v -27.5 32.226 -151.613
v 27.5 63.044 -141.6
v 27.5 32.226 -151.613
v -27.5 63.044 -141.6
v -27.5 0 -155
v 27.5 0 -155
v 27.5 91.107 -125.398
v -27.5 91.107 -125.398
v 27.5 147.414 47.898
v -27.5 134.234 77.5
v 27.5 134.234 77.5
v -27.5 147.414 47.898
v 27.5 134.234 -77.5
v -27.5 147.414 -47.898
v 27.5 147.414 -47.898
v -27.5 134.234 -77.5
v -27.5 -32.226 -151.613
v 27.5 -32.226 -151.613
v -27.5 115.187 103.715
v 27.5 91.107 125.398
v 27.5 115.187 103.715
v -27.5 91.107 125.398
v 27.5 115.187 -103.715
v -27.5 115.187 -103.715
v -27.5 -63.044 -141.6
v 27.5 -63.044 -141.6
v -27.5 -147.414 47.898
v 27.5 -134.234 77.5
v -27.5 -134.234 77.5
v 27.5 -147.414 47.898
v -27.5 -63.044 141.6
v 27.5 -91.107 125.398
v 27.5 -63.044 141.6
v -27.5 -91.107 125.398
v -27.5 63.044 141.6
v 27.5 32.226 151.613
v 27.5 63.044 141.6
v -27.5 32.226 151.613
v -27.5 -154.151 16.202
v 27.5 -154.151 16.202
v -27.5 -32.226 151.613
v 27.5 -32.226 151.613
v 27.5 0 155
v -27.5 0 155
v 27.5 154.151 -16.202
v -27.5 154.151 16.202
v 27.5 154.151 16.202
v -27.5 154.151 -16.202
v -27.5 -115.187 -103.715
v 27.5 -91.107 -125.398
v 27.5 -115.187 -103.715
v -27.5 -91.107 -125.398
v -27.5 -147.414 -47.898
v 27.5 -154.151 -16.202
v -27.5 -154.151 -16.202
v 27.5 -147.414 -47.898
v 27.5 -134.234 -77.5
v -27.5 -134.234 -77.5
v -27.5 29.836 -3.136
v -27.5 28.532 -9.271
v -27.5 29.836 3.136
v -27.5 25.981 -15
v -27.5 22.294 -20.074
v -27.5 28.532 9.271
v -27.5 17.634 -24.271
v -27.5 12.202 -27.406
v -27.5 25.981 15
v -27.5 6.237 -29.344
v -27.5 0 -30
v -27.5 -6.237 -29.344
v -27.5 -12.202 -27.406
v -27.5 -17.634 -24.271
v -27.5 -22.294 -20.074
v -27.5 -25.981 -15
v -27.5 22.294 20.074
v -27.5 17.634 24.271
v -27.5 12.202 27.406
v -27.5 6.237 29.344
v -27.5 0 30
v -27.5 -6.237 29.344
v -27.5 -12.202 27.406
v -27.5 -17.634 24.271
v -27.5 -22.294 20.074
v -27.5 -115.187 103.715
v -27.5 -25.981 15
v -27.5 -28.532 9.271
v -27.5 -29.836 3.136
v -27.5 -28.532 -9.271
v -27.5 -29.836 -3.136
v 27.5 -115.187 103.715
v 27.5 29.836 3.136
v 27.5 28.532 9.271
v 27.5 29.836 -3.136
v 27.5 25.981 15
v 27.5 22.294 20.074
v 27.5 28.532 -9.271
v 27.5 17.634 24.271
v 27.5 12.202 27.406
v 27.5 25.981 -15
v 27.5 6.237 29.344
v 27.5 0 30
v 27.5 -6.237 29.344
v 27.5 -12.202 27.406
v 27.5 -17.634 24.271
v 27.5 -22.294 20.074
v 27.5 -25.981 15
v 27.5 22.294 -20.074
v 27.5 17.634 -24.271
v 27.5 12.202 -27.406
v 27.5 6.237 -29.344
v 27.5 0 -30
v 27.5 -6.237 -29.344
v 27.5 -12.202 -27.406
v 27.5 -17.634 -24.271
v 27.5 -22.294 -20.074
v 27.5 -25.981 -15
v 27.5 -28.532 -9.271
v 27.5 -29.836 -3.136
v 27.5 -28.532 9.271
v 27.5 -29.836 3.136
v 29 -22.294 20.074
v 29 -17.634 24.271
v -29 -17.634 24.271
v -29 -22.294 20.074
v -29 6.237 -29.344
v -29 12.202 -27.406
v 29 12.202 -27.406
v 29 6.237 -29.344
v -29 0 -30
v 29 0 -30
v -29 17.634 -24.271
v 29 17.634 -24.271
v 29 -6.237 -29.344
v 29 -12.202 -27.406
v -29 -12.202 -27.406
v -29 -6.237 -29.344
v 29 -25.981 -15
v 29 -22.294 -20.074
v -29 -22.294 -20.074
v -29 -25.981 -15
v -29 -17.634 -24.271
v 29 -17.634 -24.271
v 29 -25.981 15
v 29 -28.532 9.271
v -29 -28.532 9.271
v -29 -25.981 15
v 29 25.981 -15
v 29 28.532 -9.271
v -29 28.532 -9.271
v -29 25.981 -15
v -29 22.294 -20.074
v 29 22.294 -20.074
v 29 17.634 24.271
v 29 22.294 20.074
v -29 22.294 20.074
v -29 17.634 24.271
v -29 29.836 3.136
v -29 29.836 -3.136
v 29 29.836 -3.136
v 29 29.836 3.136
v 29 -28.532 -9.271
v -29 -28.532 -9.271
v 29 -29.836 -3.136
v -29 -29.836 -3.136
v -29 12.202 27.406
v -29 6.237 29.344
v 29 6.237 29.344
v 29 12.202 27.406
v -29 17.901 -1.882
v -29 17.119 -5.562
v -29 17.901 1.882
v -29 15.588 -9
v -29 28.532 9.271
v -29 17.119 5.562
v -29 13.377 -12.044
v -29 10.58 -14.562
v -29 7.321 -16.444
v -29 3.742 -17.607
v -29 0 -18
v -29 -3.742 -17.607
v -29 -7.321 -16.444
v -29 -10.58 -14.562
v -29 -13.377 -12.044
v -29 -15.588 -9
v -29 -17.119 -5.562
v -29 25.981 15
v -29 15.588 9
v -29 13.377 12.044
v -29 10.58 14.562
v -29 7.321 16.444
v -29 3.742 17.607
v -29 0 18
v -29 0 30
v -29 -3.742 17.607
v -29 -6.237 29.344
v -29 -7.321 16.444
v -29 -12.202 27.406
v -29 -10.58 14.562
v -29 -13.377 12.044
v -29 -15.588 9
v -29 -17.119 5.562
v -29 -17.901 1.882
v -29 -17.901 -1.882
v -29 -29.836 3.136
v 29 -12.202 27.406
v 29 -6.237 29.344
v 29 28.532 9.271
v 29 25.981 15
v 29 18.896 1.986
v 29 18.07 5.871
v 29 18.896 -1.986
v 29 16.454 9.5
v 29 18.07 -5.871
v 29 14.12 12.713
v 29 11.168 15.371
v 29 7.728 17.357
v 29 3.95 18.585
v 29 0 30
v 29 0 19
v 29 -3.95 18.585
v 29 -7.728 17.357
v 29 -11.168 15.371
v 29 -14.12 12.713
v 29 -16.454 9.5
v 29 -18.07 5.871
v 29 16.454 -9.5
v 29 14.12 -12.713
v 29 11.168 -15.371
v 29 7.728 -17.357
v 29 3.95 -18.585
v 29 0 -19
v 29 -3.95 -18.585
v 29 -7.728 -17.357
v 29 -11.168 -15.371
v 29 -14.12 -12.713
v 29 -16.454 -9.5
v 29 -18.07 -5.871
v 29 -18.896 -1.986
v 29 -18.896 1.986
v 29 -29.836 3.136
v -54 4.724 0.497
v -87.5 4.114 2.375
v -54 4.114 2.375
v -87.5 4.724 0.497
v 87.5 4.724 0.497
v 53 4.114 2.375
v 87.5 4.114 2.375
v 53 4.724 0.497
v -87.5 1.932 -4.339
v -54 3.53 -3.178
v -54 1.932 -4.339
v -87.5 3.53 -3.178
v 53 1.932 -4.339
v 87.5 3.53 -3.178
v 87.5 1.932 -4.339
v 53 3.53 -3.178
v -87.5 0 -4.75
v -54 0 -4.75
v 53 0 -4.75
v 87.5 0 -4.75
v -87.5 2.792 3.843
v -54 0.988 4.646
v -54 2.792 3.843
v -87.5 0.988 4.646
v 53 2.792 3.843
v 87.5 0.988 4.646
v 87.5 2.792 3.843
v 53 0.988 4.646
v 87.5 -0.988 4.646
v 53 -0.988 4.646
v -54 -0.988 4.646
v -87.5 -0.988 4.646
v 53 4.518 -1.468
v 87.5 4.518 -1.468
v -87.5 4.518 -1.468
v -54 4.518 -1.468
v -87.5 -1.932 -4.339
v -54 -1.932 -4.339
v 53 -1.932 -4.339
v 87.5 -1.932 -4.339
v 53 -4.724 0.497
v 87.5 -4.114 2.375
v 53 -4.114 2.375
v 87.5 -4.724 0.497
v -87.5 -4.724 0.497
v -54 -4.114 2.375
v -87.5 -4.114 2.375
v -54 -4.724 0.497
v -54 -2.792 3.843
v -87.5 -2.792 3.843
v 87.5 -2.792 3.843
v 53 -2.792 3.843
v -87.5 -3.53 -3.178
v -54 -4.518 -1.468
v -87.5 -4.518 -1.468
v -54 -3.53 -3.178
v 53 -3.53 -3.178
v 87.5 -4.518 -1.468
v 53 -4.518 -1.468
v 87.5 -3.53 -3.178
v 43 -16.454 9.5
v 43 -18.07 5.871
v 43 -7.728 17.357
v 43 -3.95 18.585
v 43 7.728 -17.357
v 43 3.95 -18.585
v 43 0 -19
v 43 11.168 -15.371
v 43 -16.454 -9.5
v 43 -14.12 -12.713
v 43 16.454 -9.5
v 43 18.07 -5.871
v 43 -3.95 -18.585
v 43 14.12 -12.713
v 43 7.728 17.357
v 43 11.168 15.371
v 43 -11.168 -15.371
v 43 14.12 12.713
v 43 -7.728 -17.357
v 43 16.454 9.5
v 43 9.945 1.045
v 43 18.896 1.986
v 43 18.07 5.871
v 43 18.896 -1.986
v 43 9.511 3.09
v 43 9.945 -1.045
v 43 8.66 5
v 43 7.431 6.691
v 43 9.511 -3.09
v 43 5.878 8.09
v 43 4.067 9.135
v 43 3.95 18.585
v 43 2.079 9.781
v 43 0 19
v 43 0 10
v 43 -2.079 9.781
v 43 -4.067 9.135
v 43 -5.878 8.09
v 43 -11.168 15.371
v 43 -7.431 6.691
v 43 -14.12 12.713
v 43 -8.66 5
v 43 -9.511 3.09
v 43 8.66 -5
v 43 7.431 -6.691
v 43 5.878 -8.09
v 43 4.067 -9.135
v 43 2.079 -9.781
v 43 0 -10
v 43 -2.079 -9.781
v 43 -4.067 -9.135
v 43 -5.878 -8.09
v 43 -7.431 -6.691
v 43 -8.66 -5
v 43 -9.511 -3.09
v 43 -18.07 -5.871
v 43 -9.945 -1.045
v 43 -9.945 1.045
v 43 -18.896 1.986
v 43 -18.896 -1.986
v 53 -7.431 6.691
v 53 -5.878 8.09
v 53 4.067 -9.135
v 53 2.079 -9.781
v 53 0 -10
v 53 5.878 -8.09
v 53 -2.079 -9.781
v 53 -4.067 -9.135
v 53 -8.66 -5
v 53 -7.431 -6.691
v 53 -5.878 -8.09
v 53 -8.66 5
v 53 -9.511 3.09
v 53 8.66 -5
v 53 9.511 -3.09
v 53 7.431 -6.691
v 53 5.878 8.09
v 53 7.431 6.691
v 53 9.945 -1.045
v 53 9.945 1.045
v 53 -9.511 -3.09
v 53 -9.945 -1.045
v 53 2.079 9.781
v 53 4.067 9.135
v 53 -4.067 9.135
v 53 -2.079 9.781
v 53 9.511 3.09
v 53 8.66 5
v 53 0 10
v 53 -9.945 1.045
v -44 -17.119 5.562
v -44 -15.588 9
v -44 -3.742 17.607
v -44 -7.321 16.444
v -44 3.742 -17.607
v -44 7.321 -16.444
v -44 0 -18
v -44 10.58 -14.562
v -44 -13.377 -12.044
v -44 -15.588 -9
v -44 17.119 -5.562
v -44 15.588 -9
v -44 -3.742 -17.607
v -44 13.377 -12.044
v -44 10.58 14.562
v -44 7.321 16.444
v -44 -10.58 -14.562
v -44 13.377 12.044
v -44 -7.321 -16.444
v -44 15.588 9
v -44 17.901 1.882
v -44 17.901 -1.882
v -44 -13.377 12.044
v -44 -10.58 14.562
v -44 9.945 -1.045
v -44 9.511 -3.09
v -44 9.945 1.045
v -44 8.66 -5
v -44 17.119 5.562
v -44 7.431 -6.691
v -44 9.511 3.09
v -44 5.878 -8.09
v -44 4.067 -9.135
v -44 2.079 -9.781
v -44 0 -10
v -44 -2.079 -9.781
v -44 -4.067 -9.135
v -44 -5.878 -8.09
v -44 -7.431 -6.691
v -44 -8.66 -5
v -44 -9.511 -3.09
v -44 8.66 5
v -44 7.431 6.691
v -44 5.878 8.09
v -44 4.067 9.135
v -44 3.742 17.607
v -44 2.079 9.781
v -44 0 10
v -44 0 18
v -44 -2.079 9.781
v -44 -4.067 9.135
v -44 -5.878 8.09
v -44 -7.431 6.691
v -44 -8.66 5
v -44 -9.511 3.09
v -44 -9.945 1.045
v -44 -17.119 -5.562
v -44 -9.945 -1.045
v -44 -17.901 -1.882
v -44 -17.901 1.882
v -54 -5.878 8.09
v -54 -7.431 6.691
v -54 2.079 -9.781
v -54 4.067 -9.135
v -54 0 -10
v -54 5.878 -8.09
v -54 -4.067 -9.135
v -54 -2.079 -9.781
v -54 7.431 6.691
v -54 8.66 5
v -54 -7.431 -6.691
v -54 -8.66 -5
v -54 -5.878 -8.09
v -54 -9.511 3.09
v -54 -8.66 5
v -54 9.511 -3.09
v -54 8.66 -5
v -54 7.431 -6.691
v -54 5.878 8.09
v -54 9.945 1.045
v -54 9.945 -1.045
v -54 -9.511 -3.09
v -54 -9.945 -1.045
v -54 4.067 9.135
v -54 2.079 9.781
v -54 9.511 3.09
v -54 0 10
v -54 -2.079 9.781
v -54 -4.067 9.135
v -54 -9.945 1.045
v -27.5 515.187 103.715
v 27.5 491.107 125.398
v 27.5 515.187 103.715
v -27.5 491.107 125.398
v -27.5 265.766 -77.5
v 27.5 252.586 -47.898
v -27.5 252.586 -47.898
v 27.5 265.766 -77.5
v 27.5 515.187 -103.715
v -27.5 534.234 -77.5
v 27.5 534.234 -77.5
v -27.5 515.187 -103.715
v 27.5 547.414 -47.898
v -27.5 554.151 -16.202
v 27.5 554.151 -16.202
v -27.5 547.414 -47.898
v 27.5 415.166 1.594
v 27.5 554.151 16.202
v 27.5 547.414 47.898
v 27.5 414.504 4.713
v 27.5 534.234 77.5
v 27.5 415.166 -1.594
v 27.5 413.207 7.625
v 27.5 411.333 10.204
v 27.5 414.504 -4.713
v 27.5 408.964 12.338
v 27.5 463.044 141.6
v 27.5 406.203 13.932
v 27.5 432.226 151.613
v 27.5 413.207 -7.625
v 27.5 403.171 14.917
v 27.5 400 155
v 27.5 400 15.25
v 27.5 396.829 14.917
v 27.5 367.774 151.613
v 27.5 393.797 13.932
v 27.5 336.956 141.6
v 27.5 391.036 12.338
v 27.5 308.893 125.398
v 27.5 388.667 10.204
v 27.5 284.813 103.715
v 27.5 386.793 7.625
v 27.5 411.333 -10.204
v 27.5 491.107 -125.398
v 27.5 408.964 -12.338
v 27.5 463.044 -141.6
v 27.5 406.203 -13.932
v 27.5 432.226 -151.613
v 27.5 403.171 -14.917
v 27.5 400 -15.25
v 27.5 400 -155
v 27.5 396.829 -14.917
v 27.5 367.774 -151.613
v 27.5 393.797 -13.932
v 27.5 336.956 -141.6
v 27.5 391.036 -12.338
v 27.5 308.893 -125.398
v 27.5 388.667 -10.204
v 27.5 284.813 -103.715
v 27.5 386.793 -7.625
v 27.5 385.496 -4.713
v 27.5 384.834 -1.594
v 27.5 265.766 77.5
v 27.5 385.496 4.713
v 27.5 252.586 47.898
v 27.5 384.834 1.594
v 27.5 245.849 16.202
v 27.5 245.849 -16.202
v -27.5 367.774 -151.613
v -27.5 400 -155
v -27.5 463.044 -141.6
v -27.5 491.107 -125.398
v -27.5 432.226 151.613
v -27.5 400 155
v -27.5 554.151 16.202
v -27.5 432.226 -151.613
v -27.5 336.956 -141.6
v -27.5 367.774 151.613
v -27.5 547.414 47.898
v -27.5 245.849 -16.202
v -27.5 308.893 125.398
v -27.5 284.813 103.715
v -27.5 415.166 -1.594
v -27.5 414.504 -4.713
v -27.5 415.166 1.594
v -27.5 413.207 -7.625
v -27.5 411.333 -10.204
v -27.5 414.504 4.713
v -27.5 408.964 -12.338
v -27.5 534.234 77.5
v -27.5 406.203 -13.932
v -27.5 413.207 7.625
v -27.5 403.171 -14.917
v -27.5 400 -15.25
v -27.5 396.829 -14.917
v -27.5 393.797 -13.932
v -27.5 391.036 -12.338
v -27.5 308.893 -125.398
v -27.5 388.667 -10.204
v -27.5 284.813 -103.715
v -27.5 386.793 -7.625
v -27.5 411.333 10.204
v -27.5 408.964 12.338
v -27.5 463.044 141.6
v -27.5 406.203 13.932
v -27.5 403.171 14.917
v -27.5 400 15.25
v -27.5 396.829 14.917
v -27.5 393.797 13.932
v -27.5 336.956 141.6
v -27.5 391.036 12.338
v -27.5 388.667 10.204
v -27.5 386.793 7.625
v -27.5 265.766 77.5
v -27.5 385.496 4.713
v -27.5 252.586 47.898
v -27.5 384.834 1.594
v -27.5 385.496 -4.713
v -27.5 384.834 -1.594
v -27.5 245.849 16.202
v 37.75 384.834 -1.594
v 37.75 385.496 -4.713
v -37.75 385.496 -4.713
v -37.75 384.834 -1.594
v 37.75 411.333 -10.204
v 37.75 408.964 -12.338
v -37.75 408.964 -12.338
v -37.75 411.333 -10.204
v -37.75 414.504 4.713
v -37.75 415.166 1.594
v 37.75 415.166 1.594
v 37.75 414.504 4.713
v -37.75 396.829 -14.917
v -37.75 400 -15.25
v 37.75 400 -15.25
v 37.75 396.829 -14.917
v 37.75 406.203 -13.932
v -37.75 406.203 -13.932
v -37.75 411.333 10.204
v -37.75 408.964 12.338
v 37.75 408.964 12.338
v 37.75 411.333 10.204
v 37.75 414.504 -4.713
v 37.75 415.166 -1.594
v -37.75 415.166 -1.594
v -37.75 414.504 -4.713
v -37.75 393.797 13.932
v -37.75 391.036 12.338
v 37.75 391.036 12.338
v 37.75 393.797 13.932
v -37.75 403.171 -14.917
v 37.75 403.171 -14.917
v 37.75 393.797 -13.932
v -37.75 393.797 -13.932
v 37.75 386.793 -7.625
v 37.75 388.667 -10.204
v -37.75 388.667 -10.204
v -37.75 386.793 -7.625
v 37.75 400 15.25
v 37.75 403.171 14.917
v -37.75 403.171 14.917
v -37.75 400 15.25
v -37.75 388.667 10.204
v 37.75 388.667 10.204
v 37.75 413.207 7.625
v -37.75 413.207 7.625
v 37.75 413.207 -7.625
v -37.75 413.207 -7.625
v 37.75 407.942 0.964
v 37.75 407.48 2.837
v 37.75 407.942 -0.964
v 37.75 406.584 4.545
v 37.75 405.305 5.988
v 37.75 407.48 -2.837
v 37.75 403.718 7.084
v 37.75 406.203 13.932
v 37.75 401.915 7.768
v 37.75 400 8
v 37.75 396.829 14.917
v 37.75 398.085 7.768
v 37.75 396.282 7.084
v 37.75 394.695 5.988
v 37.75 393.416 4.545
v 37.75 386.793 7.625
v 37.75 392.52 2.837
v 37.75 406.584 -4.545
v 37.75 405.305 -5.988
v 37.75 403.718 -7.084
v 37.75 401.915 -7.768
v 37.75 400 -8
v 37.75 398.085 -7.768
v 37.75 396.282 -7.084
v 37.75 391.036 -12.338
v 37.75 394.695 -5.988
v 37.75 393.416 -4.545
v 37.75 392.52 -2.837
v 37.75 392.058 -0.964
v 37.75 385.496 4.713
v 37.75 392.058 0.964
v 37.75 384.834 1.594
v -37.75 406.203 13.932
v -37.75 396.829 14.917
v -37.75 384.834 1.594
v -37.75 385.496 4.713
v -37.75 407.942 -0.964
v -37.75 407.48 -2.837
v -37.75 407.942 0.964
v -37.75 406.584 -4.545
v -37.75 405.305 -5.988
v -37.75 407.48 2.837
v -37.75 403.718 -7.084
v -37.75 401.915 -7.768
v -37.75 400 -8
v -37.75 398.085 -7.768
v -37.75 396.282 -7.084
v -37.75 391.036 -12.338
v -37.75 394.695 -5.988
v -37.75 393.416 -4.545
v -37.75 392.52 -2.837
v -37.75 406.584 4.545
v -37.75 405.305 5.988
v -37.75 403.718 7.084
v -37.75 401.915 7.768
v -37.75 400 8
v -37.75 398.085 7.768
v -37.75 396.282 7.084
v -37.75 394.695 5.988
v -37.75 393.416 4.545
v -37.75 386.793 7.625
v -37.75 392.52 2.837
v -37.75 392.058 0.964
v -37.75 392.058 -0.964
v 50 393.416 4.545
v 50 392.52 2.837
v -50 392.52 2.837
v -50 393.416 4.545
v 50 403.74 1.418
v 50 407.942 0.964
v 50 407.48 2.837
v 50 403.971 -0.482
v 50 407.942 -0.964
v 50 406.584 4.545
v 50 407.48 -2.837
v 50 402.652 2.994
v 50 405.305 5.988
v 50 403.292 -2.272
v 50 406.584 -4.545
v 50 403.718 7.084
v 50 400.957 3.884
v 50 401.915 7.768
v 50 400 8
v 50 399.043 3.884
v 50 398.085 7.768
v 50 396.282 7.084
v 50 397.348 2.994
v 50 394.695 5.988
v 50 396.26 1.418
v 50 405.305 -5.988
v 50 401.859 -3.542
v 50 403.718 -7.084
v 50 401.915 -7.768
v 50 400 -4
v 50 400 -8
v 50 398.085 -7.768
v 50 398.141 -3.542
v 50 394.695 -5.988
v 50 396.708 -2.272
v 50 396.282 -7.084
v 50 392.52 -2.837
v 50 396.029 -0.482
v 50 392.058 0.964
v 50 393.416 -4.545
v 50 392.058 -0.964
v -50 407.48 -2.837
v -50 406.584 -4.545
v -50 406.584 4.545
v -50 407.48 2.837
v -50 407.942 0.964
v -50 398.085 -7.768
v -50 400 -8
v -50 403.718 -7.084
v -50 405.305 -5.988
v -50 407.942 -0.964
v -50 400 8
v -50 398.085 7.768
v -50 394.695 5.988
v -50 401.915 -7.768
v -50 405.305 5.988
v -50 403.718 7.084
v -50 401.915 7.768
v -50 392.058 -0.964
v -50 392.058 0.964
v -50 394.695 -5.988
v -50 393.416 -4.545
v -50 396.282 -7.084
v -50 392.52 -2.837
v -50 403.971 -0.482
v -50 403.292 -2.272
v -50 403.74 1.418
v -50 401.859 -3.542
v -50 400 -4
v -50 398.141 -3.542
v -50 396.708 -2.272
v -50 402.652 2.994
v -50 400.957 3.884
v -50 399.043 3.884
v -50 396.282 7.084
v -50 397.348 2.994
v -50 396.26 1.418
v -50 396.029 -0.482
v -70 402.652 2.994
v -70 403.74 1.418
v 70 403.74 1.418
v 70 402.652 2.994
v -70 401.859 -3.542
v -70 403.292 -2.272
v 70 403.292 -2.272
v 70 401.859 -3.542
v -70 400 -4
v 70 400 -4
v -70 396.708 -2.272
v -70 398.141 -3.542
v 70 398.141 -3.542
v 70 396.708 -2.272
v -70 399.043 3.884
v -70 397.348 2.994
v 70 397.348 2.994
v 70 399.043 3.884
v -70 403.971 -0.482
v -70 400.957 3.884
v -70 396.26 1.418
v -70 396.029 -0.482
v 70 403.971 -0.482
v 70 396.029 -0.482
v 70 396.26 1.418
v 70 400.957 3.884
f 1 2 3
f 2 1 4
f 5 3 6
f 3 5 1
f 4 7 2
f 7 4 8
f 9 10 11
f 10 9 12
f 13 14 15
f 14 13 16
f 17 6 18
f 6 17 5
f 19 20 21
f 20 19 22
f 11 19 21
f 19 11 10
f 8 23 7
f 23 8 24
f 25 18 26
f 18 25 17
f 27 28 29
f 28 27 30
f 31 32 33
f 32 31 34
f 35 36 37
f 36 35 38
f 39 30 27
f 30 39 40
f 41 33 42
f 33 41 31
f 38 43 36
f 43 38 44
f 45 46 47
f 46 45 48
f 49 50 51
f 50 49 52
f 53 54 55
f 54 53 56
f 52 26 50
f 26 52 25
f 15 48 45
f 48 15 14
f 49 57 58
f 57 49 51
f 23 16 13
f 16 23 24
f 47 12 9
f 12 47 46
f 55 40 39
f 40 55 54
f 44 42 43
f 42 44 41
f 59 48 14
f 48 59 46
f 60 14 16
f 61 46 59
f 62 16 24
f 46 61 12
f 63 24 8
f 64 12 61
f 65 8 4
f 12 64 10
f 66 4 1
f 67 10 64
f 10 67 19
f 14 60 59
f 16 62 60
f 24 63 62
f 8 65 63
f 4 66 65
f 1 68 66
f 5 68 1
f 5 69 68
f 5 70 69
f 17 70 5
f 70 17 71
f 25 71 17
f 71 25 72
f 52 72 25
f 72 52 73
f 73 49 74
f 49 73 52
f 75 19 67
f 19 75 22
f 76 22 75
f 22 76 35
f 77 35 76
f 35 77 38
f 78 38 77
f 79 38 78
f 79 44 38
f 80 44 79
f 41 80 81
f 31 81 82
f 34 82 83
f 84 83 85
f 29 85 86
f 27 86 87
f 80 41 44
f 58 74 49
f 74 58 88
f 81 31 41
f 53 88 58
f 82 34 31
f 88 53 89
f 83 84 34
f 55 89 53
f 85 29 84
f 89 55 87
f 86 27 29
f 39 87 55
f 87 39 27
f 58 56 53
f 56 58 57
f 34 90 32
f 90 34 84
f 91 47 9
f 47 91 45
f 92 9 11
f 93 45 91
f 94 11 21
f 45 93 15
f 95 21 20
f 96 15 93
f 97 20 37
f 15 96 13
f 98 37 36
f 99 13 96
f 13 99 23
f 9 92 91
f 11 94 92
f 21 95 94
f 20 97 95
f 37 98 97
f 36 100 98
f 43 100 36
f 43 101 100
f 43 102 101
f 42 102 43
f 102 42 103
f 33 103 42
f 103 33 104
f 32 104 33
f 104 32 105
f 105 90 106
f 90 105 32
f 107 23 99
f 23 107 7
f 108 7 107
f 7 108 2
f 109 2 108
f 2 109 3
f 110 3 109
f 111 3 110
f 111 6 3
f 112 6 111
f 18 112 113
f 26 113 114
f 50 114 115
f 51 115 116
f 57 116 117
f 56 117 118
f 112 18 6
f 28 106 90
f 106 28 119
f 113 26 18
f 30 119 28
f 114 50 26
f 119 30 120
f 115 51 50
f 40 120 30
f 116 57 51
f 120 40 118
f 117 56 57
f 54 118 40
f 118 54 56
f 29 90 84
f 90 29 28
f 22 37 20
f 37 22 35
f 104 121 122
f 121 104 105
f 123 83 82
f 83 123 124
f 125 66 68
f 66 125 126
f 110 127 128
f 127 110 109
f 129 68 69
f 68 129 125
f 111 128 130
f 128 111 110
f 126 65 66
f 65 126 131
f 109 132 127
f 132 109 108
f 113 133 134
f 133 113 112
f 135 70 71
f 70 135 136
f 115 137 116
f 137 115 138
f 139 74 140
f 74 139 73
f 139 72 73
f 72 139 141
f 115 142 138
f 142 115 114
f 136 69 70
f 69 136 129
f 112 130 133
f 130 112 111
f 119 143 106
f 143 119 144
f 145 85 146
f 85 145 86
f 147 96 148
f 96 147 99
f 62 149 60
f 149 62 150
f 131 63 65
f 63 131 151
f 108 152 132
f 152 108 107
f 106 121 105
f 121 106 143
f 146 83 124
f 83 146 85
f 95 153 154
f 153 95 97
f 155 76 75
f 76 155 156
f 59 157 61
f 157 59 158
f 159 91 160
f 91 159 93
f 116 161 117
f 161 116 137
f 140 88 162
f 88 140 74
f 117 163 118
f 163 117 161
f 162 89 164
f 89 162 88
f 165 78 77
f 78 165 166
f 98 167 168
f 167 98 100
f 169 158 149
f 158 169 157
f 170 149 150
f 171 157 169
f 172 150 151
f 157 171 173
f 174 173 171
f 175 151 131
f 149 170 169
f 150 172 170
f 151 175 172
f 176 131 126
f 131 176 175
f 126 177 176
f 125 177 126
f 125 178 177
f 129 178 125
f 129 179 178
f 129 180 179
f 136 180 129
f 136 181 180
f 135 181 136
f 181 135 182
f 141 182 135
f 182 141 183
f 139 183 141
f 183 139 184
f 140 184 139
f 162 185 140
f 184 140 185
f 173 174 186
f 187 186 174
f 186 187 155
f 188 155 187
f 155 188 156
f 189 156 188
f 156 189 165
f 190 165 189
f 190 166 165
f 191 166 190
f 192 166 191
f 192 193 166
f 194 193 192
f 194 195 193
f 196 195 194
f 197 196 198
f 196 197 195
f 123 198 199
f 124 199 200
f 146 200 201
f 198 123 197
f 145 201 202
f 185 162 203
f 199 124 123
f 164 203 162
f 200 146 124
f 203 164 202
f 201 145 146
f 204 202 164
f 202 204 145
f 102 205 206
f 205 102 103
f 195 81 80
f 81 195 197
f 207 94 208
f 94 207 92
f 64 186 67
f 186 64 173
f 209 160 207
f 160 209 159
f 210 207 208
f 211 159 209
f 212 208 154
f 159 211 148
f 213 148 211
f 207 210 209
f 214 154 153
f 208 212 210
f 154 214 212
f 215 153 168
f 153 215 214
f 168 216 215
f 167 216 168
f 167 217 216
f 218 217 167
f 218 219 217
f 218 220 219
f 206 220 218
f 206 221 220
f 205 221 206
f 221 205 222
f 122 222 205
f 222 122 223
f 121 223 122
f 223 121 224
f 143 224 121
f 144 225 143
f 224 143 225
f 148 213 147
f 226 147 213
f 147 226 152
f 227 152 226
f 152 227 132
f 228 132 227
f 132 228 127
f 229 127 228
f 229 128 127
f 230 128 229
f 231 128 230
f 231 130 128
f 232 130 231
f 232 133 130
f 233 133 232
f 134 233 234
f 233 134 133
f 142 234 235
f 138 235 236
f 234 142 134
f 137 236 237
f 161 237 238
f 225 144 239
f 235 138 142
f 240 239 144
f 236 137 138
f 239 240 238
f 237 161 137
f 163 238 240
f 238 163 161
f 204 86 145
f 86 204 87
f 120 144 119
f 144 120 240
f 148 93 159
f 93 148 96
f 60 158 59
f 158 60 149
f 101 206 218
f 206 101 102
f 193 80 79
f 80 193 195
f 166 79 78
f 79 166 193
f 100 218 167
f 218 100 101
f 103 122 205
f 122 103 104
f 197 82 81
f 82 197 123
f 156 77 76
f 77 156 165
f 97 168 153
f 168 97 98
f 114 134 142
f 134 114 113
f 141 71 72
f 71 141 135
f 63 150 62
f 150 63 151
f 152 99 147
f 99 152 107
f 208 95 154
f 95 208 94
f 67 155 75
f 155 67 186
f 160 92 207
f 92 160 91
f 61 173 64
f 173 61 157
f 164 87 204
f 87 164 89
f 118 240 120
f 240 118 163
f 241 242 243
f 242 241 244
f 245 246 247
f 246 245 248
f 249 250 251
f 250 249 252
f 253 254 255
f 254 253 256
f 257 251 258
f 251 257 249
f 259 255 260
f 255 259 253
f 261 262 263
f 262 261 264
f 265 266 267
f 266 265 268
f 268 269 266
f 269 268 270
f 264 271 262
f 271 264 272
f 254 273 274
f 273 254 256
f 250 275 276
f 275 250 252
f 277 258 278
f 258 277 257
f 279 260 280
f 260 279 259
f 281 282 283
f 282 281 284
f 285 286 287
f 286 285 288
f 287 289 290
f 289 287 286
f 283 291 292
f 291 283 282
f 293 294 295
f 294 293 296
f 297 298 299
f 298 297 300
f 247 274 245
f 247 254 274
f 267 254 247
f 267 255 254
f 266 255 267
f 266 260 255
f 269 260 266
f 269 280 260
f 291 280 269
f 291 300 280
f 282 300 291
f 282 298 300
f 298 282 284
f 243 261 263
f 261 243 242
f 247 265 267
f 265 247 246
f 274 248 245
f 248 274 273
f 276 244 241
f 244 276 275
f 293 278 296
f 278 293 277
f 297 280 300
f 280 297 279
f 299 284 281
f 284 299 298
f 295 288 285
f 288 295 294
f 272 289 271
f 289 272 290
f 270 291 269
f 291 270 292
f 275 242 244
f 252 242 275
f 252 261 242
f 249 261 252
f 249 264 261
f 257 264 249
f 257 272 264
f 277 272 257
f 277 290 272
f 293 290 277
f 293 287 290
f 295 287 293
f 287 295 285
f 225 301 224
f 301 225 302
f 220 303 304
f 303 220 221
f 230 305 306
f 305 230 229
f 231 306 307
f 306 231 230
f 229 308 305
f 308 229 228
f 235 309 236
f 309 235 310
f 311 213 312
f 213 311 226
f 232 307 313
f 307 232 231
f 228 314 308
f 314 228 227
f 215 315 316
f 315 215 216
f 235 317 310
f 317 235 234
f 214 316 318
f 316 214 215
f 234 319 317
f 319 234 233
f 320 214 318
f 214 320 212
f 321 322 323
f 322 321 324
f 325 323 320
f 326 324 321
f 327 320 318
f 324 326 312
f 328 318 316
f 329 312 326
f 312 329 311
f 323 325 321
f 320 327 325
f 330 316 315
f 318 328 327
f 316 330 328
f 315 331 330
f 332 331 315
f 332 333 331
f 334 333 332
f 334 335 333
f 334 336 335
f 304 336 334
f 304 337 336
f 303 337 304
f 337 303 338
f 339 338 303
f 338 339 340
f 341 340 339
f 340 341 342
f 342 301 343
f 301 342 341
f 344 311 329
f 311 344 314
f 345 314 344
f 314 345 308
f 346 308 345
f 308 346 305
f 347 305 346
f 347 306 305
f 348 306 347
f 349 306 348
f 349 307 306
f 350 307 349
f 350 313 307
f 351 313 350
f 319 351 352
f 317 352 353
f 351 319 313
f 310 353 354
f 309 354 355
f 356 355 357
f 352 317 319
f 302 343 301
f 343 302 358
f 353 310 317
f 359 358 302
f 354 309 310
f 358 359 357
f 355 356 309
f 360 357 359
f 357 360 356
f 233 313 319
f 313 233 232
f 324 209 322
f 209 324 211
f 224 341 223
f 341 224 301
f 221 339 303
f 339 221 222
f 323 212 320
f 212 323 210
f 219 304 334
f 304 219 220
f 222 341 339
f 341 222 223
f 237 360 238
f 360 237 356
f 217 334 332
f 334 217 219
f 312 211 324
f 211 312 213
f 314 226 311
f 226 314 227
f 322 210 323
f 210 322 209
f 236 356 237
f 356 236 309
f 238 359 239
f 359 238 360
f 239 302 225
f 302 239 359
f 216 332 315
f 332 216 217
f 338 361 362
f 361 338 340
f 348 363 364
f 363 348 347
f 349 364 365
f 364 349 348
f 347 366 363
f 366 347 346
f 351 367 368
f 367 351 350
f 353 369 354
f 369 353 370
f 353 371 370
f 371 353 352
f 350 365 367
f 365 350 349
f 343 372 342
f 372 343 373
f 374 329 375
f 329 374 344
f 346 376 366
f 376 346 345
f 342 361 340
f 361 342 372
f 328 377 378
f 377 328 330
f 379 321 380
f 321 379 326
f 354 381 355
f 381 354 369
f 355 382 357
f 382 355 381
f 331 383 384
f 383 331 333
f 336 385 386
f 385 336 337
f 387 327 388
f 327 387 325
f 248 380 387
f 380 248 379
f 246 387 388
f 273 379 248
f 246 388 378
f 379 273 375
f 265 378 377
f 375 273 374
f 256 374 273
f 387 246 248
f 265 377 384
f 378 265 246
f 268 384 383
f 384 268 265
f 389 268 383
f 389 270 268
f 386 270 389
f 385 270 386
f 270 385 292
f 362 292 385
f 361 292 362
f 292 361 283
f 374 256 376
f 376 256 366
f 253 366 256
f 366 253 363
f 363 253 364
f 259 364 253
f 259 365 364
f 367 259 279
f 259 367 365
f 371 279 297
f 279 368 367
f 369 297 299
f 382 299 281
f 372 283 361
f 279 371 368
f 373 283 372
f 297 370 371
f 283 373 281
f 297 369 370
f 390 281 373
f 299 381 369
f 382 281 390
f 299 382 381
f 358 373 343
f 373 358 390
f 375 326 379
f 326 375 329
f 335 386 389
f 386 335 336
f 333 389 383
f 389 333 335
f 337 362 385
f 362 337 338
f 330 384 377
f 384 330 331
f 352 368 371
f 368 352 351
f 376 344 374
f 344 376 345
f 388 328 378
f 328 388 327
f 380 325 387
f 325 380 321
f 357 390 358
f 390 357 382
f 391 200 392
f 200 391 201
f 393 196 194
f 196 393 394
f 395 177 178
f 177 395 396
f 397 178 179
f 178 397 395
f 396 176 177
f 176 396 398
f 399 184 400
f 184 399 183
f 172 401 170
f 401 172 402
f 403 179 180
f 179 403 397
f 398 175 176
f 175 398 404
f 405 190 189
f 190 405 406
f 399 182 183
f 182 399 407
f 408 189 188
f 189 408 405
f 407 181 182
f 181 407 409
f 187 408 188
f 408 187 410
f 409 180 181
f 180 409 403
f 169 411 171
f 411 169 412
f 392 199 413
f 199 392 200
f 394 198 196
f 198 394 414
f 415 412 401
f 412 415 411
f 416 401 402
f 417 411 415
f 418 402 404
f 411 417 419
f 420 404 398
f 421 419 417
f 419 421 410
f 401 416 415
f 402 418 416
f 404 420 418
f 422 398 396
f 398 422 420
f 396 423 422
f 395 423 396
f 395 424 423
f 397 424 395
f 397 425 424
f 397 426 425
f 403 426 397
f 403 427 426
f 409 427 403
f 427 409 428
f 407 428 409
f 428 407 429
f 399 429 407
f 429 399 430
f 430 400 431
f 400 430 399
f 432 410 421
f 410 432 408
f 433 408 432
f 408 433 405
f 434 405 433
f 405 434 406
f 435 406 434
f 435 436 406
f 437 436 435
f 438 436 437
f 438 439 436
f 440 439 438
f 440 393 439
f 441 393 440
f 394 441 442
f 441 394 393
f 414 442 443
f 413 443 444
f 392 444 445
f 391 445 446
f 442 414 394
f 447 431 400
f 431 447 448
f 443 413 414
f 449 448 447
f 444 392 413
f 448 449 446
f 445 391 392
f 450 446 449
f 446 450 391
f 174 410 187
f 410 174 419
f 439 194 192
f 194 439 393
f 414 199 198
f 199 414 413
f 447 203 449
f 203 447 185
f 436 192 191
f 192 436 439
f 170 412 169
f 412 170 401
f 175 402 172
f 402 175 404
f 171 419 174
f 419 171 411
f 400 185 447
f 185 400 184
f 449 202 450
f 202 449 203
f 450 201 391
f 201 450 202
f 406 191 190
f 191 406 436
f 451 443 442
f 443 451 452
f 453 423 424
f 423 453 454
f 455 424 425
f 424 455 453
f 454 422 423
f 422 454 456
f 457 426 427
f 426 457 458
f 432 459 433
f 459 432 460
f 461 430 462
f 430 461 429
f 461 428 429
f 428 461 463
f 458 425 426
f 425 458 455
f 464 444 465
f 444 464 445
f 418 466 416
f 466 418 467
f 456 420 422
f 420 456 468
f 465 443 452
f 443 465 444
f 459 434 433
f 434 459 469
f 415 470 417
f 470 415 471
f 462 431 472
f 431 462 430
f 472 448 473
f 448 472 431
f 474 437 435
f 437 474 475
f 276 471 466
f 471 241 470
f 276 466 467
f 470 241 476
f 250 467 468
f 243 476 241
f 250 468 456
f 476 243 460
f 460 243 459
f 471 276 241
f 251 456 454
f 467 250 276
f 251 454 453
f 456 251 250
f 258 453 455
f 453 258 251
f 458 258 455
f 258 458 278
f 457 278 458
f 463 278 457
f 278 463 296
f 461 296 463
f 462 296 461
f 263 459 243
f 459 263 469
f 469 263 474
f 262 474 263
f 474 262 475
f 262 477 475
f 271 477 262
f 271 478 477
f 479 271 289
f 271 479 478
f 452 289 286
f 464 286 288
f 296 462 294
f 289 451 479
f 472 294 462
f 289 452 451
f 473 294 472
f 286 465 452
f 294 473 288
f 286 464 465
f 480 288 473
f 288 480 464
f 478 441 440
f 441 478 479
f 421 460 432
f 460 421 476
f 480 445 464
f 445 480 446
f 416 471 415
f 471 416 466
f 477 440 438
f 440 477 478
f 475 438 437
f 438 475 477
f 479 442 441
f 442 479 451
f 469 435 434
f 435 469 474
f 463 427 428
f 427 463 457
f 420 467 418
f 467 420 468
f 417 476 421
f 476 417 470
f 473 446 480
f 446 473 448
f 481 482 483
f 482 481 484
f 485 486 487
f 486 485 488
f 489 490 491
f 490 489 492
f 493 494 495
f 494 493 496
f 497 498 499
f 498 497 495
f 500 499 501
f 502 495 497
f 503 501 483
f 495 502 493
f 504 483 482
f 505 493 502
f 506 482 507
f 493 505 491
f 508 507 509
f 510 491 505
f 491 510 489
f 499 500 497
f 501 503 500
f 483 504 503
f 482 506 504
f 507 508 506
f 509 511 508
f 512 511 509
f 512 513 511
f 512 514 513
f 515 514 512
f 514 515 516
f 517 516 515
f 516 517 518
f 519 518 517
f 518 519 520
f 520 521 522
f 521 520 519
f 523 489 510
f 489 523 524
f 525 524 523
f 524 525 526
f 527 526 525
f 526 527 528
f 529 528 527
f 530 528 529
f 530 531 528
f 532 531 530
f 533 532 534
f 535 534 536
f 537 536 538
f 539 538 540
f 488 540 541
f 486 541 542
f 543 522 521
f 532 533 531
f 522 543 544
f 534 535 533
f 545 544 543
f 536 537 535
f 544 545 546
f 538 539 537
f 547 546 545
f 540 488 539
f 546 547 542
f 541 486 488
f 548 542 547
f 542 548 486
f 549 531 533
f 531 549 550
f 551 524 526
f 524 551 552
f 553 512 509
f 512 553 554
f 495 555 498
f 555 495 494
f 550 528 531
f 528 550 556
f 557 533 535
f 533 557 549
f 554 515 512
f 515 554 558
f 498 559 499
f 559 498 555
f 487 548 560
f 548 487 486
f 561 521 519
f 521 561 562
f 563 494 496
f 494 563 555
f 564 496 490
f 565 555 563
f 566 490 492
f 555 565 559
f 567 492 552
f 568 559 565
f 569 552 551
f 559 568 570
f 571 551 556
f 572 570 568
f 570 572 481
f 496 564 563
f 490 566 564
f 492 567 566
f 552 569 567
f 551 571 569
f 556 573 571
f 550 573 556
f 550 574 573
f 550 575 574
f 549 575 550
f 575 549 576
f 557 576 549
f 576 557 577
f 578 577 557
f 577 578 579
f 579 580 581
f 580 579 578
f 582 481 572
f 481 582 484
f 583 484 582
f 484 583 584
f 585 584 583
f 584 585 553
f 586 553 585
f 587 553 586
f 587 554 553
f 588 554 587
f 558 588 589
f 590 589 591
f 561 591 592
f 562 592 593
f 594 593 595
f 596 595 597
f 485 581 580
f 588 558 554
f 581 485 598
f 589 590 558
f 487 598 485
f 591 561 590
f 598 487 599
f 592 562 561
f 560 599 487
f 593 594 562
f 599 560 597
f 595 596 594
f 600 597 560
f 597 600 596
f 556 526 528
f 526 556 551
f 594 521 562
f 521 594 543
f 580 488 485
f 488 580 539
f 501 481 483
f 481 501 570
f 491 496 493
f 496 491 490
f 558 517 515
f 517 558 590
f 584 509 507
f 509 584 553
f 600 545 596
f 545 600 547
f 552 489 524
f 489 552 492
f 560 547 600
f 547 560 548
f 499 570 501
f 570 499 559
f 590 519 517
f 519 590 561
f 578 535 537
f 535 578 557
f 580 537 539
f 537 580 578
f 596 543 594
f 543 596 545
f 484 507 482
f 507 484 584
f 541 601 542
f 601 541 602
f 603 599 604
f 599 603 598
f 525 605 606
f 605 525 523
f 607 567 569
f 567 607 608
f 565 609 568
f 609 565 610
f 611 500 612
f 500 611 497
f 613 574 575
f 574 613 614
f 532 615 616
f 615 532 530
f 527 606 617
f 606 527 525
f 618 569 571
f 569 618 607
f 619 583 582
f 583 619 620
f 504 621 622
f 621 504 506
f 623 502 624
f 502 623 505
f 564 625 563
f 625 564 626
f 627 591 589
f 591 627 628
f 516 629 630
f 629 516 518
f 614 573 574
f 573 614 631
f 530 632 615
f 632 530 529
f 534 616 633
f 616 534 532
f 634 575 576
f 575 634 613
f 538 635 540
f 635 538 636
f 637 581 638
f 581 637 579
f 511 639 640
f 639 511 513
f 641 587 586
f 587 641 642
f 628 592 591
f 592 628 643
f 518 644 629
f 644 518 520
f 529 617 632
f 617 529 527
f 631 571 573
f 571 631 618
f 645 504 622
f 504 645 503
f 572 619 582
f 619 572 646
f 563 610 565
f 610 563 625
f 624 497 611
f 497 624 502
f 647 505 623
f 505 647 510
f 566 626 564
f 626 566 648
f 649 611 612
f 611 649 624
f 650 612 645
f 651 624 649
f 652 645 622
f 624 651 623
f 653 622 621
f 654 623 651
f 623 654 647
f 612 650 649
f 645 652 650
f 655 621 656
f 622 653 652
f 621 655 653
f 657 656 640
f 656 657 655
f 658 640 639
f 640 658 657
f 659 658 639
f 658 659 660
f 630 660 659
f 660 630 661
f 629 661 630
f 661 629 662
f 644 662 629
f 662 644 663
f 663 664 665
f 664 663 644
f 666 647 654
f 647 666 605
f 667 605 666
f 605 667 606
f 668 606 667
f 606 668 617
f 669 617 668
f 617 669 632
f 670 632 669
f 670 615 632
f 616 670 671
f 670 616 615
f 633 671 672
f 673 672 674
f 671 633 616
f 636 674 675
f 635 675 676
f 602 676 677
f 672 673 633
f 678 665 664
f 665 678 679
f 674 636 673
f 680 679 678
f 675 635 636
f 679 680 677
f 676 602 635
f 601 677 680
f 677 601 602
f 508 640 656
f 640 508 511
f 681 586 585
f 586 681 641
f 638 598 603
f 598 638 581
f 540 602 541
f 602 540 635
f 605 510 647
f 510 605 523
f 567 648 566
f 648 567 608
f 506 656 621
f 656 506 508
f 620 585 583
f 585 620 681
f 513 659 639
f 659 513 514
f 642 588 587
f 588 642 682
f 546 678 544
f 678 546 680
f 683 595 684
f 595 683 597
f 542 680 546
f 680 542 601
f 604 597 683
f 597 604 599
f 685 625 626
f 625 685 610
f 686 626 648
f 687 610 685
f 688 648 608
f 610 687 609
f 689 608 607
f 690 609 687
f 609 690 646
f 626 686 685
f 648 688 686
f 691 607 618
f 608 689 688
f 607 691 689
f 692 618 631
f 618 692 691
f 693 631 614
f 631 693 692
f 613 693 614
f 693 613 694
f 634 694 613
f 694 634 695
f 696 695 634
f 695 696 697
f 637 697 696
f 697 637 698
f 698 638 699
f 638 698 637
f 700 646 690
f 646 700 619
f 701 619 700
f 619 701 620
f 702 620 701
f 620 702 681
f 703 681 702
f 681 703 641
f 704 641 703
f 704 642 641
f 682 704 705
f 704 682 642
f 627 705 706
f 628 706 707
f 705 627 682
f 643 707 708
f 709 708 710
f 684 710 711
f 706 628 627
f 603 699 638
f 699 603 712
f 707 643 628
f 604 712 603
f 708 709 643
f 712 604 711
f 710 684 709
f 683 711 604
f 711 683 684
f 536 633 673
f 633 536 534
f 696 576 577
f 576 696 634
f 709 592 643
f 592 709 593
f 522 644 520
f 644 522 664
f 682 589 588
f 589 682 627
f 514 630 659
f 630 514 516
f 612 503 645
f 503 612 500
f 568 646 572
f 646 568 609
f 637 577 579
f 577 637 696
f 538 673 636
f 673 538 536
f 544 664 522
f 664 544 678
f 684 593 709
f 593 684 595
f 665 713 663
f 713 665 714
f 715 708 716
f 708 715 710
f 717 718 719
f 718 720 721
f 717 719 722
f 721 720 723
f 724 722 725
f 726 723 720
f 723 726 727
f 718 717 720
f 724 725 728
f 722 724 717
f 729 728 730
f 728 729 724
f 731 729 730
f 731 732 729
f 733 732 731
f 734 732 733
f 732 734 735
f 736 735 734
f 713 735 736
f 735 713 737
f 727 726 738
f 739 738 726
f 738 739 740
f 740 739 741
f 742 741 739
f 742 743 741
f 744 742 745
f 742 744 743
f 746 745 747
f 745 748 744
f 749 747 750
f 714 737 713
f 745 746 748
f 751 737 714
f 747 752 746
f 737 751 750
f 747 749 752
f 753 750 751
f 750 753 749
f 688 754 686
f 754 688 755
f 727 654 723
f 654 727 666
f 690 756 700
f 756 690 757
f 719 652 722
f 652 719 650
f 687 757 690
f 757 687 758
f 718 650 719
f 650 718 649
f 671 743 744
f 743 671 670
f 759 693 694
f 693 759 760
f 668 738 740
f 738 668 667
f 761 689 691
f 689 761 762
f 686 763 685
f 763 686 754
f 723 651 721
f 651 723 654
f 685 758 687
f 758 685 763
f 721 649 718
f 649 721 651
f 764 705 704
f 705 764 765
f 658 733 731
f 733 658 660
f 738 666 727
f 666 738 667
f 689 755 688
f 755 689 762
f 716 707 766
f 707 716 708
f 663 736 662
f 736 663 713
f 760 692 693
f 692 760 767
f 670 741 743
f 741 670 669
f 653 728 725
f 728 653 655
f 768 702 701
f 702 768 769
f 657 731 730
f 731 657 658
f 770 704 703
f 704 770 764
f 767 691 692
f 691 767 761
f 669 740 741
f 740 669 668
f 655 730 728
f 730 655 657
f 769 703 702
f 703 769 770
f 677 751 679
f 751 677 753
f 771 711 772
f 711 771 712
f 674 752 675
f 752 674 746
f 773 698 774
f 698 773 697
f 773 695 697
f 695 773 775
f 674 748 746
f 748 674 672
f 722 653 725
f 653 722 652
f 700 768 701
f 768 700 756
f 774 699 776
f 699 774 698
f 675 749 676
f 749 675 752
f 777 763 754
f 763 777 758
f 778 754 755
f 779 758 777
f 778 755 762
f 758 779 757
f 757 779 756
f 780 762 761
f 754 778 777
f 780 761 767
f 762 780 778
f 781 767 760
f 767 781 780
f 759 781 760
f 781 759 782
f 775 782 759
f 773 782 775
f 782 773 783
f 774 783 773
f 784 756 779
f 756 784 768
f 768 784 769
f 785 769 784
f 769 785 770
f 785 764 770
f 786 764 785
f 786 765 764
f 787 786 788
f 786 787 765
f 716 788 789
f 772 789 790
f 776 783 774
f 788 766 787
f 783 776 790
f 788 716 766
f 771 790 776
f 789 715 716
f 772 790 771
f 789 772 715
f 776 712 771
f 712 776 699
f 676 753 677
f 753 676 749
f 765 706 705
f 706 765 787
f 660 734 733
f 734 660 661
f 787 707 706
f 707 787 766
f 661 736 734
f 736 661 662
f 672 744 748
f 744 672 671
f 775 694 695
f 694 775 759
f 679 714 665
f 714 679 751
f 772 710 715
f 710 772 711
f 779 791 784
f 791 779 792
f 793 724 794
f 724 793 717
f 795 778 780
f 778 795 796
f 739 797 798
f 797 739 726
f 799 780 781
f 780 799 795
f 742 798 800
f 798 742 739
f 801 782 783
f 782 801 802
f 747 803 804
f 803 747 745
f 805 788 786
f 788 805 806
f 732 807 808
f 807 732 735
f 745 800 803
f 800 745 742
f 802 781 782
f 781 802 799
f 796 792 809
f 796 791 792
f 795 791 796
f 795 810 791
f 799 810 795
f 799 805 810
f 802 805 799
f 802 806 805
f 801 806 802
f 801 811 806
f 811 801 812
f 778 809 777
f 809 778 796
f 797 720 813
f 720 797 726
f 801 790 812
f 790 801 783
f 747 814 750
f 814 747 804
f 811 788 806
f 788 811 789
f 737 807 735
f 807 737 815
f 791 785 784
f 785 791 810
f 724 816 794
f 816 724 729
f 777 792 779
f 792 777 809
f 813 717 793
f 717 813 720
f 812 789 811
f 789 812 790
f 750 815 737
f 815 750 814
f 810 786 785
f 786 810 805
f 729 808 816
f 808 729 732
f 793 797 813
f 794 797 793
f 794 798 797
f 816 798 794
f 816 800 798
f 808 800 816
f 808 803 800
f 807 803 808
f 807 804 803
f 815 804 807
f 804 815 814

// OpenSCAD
module back_wheel(tire=true) {
    rotate([0,90,0]) {
        if (tire) {
            cylinder(d=310, h=55, center=true);
        }
        cylinder(d=60, h=58, center=true);
        cylinder(d=9.5, h=175, center=true);
        
        translate([0,0,29]) cylinder(d=38, h=14);
        translate([0,0,29+14]) cylinder(d=20, h=10);
        
        translate([0,0,-29-15]) cylinder(d=36, h=15);
        translate([0,0,-29-15-10]) cylinder(d=20, h=10);
        
    }
}


module front_wheel() {
    rotate([0,90,0]) {
        cylinder(d=310, h=55, center=true);
        cylinder(d=30.5, h=75.5, center=true);
        cylinder(d=16, h=100, center=true);
        cylinder(d=8, h=140, center=true);
    }
}


back_wheel();

translate([0,400,0]) front_wheel();
